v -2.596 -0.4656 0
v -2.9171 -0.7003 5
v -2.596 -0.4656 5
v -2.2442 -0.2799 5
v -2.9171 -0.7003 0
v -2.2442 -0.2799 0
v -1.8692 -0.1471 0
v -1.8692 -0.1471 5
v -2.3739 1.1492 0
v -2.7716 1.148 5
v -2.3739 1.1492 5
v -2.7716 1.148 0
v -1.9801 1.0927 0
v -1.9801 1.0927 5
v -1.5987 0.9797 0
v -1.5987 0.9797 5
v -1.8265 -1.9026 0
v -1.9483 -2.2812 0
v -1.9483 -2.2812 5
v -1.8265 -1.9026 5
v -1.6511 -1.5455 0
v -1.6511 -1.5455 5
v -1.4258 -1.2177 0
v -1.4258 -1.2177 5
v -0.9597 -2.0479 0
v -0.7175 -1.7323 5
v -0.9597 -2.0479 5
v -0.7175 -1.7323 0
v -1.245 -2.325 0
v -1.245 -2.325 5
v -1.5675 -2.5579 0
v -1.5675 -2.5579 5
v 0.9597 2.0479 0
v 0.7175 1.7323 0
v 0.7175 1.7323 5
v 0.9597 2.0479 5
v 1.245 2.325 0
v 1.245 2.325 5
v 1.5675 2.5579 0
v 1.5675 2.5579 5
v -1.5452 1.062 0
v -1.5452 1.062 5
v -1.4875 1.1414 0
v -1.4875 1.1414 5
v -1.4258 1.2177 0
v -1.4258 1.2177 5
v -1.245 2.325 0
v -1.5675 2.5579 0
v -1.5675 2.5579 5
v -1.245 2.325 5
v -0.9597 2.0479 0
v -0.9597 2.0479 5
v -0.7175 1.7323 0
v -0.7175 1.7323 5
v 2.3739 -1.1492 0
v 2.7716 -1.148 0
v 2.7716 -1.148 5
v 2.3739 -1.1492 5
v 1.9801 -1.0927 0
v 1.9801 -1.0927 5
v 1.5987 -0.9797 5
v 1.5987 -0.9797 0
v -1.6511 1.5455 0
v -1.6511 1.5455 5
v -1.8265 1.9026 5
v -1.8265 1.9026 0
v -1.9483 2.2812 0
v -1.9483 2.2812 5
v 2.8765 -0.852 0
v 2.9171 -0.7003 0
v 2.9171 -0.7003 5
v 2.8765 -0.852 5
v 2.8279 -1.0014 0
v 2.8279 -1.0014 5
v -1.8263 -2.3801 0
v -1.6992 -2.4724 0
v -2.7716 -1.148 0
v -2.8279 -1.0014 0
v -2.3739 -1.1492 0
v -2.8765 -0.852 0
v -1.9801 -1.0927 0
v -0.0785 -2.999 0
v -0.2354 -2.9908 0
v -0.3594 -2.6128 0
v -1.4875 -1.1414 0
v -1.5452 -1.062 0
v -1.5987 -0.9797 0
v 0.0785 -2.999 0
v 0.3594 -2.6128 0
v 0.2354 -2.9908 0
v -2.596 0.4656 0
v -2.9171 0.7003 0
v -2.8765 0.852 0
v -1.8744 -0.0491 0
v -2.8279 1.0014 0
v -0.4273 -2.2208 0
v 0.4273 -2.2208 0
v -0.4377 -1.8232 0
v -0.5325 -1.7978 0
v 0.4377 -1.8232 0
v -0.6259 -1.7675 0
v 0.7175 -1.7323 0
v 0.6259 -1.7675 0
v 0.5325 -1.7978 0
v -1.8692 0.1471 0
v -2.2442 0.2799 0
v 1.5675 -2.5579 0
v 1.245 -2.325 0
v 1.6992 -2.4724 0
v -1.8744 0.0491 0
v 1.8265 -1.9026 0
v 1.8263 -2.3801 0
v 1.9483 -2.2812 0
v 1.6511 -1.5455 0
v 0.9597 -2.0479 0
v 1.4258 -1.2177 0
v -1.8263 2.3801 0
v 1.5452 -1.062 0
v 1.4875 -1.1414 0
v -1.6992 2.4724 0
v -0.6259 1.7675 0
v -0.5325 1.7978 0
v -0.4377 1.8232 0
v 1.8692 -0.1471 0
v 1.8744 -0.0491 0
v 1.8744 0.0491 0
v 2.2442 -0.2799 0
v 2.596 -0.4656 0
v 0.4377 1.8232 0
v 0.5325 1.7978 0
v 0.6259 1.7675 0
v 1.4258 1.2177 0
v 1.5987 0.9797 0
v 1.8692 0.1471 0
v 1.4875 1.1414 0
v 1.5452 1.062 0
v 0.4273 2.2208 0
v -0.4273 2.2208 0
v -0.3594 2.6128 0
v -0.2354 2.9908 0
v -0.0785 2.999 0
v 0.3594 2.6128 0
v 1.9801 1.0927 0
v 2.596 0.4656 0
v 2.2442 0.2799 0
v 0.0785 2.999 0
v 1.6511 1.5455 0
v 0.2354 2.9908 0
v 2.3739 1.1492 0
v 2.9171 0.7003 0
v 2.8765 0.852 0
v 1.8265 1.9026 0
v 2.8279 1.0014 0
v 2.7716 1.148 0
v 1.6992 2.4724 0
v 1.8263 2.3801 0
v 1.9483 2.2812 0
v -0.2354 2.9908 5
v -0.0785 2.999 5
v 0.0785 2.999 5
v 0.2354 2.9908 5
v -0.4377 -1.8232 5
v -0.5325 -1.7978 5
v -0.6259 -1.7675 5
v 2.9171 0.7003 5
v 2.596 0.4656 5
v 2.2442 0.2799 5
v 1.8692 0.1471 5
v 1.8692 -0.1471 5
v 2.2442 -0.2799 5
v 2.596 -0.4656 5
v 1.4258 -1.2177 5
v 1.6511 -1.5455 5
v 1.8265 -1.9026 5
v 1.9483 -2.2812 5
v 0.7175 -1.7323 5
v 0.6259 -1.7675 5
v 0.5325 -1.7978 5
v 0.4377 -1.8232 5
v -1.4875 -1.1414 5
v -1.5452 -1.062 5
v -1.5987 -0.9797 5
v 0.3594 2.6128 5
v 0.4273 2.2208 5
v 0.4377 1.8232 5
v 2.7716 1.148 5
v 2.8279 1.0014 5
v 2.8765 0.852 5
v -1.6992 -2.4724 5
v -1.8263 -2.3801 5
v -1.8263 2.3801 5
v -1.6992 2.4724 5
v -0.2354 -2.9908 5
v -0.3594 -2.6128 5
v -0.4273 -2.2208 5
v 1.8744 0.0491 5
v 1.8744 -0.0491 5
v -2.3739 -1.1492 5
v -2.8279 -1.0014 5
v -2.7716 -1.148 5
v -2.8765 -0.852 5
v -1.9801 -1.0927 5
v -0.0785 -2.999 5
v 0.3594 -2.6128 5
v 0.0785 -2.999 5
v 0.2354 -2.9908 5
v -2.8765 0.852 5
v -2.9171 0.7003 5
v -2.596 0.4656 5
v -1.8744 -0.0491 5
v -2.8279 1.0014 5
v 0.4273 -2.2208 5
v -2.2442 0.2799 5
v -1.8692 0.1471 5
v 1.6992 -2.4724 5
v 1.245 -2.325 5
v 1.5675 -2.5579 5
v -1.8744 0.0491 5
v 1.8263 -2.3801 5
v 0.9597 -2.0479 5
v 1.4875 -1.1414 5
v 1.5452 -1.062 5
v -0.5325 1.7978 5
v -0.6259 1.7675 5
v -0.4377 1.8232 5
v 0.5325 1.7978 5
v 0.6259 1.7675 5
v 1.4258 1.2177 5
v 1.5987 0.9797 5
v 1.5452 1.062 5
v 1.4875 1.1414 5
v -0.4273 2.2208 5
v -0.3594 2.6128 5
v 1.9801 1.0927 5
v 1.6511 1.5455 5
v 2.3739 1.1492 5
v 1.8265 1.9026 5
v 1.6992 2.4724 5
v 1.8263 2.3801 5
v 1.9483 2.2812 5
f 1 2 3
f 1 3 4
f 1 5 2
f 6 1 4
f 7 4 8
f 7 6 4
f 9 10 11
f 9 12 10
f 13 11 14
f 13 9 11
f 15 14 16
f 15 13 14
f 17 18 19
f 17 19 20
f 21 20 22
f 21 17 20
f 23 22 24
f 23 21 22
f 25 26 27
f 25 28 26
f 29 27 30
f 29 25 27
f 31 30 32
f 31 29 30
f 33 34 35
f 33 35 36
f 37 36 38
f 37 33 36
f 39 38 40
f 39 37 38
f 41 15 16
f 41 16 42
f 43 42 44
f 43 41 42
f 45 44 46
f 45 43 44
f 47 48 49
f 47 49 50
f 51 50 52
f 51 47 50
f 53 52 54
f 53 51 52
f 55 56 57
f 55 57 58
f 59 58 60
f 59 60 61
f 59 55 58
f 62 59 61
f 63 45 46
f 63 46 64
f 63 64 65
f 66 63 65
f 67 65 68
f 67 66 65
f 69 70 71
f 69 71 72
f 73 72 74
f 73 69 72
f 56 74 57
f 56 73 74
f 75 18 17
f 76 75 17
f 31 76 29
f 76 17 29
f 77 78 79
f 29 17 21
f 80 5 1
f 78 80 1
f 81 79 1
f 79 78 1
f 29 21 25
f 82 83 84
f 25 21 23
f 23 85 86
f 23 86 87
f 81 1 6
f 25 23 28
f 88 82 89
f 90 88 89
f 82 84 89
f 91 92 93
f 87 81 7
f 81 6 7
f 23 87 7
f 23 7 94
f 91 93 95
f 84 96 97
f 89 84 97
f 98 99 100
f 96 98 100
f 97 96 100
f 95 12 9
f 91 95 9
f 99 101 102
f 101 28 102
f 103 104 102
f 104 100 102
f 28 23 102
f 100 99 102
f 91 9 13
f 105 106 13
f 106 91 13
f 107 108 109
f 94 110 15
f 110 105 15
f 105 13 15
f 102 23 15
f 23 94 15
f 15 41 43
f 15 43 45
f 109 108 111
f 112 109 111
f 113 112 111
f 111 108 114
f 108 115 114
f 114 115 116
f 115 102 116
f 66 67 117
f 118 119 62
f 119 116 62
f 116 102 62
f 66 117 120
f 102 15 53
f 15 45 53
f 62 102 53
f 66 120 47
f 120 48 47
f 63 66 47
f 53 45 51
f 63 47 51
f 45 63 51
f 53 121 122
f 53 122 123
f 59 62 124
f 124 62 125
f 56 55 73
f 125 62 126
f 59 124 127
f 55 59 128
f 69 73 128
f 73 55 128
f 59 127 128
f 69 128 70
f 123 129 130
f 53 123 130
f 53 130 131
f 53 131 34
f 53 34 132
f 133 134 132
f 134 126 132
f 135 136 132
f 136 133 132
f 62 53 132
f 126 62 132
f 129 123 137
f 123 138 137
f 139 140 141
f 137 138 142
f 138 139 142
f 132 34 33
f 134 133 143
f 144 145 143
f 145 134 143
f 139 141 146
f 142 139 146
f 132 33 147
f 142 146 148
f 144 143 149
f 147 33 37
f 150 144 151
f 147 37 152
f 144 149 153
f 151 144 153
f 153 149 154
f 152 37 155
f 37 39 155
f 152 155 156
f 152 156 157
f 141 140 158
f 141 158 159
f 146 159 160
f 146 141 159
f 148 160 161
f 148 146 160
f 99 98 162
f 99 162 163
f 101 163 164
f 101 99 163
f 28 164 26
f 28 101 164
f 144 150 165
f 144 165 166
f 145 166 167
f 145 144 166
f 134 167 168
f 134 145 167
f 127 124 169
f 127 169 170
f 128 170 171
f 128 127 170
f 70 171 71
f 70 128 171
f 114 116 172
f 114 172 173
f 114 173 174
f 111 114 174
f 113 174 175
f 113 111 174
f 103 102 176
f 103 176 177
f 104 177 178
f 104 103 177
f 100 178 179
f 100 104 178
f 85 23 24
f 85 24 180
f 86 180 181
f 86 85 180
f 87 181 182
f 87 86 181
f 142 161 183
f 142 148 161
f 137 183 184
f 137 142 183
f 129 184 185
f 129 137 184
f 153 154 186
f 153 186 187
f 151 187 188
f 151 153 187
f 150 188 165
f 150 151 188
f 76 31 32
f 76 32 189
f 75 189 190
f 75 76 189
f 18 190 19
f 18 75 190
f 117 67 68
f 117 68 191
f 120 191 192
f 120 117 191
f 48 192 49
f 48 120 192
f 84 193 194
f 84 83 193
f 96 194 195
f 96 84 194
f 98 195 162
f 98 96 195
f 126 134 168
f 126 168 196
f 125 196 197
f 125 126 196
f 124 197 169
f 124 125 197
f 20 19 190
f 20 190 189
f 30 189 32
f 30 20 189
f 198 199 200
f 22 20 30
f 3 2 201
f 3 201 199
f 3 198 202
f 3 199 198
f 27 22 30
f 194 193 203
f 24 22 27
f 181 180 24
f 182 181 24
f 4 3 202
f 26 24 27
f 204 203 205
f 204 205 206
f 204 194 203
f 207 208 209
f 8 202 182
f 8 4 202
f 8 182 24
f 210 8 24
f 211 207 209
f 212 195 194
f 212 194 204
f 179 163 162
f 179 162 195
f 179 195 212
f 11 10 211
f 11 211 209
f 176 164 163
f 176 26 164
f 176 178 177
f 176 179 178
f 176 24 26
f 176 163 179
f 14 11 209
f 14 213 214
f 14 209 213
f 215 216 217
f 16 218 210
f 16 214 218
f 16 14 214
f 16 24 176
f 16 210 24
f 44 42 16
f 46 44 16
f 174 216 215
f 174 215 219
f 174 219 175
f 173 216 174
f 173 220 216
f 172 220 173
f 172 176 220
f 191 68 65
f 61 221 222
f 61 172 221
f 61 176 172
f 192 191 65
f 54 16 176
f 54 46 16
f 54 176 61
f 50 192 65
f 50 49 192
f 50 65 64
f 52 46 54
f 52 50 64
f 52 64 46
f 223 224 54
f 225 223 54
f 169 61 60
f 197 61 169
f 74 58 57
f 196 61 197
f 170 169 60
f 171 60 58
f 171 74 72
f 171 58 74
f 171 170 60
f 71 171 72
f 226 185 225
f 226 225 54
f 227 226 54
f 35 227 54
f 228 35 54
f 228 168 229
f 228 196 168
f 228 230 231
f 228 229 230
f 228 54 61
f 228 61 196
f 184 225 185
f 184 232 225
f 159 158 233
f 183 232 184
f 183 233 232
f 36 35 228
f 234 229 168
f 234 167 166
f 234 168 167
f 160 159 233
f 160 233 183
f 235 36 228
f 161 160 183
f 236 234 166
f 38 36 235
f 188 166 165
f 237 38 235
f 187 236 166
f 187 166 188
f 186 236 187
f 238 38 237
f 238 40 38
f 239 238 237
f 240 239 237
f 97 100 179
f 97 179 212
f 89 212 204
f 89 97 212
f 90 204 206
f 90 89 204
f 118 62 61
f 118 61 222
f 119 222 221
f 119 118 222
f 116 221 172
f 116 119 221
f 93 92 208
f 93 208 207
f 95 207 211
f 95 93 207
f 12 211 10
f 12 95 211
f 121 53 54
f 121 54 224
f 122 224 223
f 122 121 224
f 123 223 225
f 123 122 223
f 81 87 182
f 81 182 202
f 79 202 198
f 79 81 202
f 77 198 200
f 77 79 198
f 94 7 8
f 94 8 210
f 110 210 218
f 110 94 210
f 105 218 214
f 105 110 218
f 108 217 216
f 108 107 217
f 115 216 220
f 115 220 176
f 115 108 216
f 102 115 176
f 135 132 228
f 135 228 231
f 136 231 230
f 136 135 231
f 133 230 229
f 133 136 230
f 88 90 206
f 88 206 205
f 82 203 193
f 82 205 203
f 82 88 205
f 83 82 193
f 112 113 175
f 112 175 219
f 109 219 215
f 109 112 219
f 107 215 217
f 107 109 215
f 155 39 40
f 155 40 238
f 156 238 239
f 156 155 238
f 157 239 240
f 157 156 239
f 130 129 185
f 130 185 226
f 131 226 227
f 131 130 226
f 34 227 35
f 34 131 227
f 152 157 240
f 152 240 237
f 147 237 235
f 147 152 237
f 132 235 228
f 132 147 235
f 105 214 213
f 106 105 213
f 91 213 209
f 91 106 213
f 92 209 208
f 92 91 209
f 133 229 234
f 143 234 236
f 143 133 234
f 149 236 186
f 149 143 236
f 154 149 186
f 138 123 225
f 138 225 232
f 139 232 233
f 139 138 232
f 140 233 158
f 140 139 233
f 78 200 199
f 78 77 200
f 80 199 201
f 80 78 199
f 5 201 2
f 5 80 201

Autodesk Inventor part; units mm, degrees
sketch "Sketch1" plane through (0, 0, 0) normal (0, 0, 1) x (1, 0, 0)
  circle A0 centre (0, 0) radius 3
  dimension "d0" = 6
extrude "Extrusion1" add sketch "Sketch1" along normal blind 5
ref_plane "Work Plane2" through (0, 0, 2.5) normal (0, 0, 1) x (1, 0, 0)
sketch "Sketch2" plane through (0, 0, 0) normal (0, 0, -1) x (-1, 0, 0)
  circle A0 centre (0, 0) radius 3 projected
  circle A1 centre (0, 0) radius 2.5
  dimension "d3" = 5
surface extrude "Pitch Diameter" sketch "Sketch2" against normal through all shown no curves A1
ref_plane "Work Plane8" through (0, 0, 0) normal (0.9510565, 0.309017, 0) x (0, 0, 1)
ref_plane "Work Plane9" through (0, 0, 0) normal (1, 0, 0) x (0, 1, 0)
spur gear teeth "Spur Gear" teeth 10 pitch diameter 5 tip diameter 6 root diameter 3.75 face width 5 start plane through (0, 0, 0) normal (0, 0, -1) x (-1, 0, 0)
equation "\"d0\" = da_da"
equation "\"d1\" = da_b"
equation "\"d3\" = da_dw"
equation "\"d16\" = da_aw"
equation "\"d43\" = da_aw"
equation "\"d46\" = da_aw"
equation "\"da_da\" = 6"
equation "\"da_b\" = 5"
equation "\"da_dw\" = 5"
equation "\"da_aw\" = 12"
properties part number "Spur Gear1" material "Steel"
